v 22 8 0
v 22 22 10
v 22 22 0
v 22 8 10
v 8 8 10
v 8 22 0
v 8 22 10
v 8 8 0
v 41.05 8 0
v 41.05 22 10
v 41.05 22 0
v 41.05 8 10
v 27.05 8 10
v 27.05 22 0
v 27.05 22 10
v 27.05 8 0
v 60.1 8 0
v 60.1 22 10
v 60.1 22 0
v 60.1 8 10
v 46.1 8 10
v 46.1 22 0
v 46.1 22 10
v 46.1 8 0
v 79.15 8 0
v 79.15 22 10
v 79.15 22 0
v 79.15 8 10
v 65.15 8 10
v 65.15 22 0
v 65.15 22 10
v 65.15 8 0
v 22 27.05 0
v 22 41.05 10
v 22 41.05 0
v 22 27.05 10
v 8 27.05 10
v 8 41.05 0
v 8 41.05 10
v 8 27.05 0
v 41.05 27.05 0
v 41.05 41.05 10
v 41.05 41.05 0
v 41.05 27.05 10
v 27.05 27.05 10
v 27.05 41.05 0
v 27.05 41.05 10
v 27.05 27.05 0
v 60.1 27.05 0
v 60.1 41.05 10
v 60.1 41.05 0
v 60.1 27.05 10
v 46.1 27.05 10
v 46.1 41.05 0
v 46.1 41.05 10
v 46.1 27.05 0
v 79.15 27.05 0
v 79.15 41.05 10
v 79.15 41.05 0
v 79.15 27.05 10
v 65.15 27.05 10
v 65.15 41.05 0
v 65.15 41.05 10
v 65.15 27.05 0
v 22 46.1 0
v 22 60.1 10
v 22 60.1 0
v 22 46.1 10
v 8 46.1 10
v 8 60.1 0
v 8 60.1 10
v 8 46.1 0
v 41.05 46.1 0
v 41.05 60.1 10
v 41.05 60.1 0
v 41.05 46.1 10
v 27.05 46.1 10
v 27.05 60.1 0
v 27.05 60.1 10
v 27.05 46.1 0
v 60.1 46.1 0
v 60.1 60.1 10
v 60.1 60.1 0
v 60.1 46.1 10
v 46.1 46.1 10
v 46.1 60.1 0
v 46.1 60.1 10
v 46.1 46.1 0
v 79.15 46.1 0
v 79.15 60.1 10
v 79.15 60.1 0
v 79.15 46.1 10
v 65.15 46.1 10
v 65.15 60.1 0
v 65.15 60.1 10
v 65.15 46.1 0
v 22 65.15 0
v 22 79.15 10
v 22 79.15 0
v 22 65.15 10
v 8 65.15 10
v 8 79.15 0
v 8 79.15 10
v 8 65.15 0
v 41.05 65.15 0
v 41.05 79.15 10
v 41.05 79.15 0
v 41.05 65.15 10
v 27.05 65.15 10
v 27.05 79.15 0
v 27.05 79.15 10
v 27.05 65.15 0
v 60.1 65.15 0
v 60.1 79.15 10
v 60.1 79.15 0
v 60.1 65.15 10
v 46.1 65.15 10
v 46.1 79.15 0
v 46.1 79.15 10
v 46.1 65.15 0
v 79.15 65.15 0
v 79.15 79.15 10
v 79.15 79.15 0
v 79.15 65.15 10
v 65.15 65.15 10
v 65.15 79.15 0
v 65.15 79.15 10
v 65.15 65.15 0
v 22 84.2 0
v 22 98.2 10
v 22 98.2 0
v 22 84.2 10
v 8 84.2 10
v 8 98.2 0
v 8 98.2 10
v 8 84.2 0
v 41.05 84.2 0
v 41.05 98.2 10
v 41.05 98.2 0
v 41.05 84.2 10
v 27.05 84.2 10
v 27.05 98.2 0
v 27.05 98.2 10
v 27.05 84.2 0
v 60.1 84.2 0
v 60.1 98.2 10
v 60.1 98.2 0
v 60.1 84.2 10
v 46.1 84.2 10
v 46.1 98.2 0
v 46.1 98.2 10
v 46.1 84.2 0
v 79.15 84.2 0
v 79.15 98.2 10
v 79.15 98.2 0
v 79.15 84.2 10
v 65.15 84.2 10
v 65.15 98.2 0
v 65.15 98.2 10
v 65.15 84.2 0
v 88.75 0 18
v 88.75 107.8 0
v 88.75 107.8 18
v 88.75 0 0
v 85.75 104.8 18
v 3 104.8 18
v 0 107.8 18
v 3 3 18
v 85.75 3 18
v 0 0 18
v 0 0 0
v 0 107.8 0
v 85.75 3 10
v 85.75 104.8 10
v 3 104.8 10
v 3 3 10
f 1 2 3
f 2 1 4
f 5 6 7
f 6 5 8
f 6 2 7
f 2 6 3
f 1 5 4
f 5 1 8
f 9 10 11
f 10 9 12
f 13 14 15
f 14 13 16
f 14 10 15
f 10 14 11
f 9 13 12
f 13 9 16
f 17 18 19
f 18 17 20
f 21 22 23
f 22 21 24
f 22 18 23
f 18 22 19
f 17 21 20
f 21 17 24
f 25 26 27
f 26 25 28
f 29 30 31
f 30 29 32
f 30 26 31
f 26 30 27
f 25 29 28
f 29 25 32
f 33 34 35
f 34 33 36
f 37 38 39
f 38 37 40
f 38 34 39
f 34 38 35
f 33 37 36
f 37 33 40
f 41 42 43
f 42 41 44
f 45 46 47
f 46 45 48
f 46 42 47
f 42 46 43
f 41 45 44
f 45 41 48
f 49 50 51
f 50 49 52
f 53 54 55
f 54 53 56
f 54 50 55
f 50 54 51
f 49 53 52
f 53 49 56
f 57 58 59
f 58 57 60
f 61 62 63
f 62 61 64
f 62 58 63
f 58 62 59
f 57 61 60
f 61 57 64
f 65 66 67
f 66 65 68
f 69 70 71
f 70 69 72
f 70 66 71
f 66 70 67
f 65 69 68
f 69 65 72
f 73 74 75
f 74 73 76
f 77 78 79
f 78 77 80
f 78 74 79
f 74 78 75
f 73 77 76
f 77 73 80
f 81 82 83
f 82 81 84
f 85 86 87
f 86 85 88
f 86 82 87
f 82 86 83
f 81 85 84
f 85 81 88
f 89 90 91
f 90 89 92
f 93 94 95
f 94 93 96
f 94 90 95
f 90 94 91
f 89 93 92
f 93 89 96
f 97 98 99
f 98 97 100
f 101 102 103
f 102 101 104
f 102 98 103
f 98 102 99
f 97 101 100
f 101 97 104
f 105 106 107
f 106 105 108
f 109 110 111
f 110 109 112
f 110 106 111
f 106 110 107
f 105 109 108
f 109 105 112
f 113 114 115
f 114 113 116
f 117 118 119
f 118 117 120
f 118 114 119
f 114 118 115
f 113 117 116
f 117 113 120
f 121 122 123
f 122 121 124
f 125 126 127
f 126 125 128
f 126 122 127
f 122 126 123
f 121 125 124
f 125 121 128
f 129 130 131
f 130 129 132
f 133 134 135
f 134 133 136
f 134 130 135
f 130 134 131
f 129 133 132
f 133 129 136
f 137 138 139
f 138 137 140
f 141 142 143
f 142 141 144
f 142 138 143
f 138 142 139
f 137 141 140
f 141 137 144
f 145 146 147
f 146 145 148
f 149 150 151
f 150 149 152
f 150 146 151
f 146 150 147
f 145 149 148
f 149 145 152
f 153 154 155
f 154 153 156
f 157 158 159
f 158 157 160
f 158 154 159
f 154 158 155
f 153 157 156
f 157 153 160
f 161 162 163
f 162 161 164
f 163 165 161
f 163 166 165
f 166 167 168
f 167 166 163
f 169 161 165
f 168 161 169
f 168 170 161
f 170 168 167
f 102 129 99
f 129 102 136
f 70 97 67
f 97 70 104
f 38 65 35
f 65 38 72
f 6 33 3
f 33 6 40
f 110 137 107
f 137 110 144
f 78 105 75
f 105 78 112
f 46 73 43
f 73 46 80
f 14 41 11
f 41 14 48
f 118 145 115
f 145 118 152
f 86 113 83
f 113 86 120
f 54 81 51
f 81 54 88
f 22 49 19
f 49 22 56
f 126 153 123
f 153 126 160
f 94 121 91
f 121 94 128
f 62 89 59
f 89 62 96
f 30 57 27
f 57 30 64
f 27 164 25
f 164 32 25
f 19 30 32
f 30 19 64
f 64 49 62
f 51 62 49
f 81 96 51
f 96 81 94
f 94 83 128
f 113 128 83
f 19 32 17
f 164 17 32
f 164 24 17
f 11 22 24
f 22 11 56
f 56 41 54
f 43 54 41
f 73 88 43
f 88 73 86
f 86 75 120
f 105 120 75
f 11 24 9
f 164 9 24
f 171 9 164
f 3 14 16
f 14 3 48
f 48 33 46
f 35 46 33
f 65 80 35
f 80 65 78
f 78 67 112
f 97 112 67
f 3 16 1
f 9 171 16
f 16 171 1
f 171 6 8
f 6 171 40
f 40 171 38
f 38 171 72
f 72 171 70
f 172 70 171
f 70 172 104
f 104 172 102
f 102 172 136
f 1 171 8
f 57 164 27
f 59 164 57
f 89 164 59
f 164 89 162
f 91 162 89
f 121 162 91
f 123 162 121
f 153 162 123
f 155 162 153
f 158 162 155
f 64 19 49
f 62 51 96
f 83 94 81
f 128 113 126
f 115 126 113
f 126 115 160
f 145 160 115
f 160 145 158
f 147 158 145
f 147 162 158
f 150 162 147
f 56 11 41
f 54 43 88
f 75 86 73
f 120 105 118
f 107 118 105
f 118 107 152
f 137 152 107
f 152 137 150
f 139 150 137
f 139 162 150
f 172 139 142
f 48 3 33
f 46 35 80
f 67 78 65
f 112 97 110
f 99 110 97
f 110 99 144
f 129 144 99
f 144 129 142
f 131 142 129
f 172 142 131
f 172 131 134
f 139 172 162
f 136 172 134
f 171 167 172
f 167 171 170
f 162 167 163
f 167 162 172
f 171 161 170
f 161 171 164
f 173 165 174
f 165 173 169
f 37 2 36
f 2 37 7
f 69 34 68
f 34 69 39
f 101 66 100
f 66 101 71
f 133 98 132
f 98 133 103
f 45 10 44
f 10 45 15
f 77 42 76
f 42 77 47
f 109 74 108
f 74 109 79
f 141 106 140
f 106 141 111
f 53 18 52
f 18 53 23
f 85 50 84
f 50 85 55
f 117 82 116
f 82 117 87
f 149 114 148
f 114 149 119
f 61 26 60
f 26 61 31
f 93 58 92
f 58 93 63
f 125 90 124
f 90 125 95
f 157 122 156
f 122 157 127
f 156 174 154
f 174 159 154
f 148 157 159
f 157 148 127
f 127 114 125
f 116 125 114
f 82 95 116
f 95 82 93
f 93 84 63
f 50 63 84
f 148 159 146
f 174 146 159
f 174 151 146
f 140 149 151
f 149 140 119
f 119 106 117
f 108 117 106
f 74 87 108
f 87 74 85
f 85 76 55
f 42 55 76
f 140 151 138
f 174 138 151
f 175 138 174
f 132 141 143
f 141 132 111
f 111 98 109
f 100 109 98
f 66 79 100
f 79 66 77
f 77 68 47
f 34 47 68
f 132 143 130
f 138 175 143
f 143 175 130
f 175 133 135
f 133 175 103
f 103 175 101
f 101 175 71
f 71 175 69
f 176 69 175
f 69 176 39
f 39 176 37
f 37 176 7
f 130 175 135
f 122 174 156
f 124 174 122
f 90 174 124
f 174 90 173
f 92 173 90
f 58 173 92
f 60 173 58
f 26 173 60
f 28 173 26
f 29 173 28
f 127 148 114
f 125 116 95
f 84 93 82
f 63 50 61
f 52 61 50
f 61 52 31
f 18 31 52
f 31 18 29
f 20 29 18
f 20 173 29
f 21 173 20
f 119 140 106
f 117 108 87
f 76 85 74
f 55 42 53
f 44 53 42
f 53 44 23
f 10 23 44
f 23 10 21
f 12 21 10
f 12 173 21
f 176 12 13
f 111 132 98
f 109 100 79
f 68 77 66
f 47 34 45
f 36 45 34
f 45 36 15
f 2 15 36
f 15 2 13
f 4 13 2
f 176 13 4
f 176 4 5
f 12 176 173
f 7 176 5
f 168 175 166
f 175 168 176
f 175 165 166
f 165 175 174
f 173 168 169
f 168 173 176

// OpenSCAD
// Generated keyboard case
// Layout: 5x4
// Switch type: Cherry MX

// Parameters
case_width = 88.75;
case_height = 107.80;
case_depth = 18.00;
wall_thickness = 3.00;
base_height = 10.00;
switch_cutout_size = 14.00;
key_spacing = 19.05;

module keyboard_case() {
    difference() {
        // Outer shell
        translate([0, 0, 0])
            cube([case_width, case_height, case_depth]);

        // Inner cavity
        translate([wall_thickness, wall_thickness, base_height])
            cube([case_width - 2*wall_thickness, 
                  case_height - 2*wall_thickness, 
                  case_depth - base_height + 1]);

        // Switch cutouts
        translate([wall_thickness + 5, wall_thickness + 5, -1])
            switch_plate();
    }
}

module switch_plate() {
    for (row = [0:4]) {
        for (col = [0:3]) {
            translate([col * key_spacing, row * key_spacing, 0])
                cube([switch_cutout_size, switch_cutout_size, base_height + 2]);
        }
    }
}

// Generate the case
keyboard_case();
